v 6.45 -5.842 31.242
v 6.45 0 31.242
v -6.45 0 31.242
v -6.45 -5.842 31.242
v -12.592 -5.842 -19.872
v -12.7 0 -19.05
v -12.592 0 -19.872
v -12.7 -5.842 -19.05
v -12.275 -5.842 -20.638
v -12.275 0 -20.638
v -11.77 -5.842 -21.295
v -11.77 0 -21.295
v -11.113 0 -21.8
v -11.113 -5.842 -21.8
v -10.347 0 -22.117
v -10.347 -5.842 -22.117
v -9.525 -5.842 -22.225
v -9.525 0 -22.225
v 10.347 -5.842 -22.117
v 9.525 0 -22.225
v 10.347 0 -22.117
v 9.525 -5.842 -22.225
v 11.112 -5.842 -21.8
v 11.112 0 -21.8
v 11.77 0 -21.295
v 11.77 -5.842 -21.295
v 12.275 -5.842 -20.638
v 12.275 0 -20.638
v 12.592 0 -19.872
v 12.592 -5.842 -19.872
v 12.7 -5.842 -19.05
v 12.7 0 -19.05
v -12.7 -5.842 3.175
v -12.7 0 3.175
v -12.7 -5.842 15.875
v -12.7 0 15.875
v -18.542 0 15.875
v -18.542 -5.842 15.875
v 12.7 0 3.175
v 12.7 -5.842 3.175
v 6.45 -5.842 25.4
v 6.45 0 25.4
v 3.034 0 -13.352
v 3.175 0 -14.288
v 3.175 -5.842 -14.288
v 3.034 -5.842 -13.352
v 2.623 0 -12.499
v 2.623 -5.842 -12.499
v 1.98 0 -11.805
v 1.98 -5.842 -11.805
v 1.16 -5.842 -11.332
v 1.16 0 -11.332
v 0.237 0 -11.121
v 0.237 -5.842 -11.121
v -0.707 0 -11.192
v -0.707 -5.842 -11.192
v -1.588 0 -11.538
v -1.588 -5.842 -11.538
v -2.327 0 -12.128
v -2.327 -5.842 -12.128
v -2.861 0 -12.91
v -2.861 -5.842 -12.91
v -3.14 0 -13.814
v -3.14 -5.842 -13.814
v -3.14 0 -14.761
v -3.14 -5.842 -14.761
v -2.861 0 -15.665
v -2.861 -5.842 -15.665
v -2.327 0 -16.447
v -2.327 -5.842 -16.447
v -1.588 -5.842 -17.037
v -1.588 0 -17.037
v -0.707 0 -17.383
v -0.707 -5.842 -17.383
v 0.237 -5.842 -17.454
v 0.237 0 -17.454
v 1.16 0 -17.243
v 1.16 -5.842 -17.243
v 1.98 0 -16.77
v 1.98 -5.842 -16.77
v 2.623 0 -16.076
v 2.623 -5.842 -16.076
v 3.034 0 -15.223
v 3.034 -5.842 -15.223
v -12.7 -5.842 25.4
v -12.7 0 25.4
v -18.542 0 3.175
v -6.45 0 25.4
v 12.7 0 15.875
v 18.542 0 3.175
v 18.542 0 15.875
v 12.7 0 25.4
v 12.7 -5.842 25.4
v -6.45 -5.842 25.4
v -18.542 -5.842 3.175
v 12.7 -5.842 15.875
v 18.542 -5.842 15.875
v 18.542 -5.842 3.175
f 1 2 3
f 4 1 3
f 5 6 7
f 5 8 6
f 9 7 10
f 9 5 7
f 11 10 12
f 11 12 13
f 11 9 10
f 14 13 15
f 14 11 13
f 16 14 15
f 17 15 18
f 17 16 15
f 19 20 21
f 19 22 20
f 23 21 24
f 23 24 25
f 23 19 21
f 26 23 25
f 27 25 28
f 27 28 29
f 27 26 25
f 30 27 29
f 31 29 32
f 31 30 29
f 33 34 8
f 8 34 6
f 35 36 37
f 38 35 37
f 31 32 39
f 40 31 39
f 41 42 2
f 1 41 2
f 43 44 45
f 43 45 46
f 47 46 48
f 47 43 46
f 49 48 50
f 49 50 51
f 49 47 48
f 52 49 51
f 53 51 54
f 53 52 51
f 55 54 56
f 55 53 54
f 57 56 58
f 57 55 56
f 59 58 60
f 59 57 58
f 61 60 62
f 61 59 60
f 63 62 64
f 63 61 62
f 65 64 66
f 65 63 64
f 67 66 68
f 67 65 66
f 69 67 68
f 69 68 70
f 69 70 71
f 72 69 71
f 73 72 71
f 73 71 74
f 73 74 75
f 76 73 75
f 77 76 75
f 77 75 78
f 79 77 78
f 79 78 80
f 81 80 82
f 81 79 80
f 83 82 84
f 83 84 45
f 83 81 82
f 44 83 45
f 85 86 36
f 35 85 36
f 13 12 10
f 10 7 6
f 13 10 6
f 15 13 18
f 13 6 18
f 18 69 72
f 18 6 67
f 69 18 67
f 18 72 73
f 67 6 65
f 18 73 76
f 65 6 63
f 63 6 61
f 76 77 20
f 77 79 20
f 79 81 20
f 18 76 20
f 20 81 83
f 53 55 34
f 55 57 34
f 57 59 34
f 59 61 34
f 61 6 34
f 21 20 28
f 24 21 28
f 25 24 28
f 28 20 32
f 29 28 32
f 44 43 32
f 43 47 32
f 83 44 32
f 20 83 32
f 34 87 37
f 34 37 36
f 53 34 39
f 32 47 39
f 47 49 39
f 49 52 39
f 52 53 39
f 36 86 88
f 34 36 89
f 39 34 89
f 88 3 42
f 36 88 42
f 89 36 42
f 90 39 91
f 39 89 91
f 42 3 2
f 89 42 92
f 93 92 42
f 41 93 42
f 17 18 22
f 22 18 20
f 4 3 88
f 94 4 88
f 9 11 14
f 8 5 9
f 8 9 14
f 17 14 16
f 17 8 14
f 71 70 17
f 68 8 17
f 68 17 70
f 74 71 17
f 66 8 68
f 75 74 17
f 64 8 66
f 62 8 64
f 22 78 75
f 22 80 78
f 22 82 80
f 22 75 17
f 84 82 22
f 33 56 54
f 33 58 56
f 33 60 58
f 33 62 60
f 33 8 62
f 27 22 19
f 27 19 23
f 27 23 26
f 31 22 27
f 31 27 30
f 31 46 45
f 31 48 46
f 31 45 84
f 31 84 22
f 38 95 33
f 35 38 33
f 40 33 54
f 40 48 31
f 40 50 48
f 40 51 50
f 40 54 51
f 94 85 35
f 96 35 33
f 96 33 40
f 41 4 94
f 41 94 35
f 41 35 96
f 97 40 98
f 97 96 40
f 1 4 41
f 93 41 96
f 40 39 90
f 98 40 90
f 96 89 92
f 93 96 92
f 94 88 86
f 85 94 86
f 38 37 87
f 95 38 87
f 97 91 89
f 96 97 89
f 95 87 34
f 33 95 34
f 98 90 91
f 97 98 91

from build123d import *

# Parameters (mm, degrees)
F0_R     = 3.175
F1_DEPTH = 5.842
F2_R     = 3.175


with BuildPart() as f1:
    # F0 (on Front) → F1 (new body)
    with BuildSketch(Plane.XZ):
        Polygon((-6.45, 25.4), (-12.7, 25.4), (-12.7, 15.875), (-18.542, 15.875), (-18.542, 3.175), (-12.7, 3.175), (-12.7, -6.35), (-12.7, -22.225), (12.7, -22.225), (12.7, -6.35), (12.7, 3.175), (18.542, 3.175), (18.542, 15.875), (12.7, 15.875), (12.7, 25.4), (6.45, 25.4), (6.45, 31.242), (-6.45, 31.242), align=None)
        with Locations((0, -14.2875)):
            Circle(F0_R, mode=Mode.SUBTRACT)
    extrude(amount=F1_DEPTH)

    # F2
    f2_edges = [f1.edges().sort_by_distance(p)[0] for p in [
        (-12.7, -2.921, -22.225),
        (12.7, -2.921, -22.225),
    ]]
    fillet(f2_edges, radius=F2_R)


solid = f1.part
